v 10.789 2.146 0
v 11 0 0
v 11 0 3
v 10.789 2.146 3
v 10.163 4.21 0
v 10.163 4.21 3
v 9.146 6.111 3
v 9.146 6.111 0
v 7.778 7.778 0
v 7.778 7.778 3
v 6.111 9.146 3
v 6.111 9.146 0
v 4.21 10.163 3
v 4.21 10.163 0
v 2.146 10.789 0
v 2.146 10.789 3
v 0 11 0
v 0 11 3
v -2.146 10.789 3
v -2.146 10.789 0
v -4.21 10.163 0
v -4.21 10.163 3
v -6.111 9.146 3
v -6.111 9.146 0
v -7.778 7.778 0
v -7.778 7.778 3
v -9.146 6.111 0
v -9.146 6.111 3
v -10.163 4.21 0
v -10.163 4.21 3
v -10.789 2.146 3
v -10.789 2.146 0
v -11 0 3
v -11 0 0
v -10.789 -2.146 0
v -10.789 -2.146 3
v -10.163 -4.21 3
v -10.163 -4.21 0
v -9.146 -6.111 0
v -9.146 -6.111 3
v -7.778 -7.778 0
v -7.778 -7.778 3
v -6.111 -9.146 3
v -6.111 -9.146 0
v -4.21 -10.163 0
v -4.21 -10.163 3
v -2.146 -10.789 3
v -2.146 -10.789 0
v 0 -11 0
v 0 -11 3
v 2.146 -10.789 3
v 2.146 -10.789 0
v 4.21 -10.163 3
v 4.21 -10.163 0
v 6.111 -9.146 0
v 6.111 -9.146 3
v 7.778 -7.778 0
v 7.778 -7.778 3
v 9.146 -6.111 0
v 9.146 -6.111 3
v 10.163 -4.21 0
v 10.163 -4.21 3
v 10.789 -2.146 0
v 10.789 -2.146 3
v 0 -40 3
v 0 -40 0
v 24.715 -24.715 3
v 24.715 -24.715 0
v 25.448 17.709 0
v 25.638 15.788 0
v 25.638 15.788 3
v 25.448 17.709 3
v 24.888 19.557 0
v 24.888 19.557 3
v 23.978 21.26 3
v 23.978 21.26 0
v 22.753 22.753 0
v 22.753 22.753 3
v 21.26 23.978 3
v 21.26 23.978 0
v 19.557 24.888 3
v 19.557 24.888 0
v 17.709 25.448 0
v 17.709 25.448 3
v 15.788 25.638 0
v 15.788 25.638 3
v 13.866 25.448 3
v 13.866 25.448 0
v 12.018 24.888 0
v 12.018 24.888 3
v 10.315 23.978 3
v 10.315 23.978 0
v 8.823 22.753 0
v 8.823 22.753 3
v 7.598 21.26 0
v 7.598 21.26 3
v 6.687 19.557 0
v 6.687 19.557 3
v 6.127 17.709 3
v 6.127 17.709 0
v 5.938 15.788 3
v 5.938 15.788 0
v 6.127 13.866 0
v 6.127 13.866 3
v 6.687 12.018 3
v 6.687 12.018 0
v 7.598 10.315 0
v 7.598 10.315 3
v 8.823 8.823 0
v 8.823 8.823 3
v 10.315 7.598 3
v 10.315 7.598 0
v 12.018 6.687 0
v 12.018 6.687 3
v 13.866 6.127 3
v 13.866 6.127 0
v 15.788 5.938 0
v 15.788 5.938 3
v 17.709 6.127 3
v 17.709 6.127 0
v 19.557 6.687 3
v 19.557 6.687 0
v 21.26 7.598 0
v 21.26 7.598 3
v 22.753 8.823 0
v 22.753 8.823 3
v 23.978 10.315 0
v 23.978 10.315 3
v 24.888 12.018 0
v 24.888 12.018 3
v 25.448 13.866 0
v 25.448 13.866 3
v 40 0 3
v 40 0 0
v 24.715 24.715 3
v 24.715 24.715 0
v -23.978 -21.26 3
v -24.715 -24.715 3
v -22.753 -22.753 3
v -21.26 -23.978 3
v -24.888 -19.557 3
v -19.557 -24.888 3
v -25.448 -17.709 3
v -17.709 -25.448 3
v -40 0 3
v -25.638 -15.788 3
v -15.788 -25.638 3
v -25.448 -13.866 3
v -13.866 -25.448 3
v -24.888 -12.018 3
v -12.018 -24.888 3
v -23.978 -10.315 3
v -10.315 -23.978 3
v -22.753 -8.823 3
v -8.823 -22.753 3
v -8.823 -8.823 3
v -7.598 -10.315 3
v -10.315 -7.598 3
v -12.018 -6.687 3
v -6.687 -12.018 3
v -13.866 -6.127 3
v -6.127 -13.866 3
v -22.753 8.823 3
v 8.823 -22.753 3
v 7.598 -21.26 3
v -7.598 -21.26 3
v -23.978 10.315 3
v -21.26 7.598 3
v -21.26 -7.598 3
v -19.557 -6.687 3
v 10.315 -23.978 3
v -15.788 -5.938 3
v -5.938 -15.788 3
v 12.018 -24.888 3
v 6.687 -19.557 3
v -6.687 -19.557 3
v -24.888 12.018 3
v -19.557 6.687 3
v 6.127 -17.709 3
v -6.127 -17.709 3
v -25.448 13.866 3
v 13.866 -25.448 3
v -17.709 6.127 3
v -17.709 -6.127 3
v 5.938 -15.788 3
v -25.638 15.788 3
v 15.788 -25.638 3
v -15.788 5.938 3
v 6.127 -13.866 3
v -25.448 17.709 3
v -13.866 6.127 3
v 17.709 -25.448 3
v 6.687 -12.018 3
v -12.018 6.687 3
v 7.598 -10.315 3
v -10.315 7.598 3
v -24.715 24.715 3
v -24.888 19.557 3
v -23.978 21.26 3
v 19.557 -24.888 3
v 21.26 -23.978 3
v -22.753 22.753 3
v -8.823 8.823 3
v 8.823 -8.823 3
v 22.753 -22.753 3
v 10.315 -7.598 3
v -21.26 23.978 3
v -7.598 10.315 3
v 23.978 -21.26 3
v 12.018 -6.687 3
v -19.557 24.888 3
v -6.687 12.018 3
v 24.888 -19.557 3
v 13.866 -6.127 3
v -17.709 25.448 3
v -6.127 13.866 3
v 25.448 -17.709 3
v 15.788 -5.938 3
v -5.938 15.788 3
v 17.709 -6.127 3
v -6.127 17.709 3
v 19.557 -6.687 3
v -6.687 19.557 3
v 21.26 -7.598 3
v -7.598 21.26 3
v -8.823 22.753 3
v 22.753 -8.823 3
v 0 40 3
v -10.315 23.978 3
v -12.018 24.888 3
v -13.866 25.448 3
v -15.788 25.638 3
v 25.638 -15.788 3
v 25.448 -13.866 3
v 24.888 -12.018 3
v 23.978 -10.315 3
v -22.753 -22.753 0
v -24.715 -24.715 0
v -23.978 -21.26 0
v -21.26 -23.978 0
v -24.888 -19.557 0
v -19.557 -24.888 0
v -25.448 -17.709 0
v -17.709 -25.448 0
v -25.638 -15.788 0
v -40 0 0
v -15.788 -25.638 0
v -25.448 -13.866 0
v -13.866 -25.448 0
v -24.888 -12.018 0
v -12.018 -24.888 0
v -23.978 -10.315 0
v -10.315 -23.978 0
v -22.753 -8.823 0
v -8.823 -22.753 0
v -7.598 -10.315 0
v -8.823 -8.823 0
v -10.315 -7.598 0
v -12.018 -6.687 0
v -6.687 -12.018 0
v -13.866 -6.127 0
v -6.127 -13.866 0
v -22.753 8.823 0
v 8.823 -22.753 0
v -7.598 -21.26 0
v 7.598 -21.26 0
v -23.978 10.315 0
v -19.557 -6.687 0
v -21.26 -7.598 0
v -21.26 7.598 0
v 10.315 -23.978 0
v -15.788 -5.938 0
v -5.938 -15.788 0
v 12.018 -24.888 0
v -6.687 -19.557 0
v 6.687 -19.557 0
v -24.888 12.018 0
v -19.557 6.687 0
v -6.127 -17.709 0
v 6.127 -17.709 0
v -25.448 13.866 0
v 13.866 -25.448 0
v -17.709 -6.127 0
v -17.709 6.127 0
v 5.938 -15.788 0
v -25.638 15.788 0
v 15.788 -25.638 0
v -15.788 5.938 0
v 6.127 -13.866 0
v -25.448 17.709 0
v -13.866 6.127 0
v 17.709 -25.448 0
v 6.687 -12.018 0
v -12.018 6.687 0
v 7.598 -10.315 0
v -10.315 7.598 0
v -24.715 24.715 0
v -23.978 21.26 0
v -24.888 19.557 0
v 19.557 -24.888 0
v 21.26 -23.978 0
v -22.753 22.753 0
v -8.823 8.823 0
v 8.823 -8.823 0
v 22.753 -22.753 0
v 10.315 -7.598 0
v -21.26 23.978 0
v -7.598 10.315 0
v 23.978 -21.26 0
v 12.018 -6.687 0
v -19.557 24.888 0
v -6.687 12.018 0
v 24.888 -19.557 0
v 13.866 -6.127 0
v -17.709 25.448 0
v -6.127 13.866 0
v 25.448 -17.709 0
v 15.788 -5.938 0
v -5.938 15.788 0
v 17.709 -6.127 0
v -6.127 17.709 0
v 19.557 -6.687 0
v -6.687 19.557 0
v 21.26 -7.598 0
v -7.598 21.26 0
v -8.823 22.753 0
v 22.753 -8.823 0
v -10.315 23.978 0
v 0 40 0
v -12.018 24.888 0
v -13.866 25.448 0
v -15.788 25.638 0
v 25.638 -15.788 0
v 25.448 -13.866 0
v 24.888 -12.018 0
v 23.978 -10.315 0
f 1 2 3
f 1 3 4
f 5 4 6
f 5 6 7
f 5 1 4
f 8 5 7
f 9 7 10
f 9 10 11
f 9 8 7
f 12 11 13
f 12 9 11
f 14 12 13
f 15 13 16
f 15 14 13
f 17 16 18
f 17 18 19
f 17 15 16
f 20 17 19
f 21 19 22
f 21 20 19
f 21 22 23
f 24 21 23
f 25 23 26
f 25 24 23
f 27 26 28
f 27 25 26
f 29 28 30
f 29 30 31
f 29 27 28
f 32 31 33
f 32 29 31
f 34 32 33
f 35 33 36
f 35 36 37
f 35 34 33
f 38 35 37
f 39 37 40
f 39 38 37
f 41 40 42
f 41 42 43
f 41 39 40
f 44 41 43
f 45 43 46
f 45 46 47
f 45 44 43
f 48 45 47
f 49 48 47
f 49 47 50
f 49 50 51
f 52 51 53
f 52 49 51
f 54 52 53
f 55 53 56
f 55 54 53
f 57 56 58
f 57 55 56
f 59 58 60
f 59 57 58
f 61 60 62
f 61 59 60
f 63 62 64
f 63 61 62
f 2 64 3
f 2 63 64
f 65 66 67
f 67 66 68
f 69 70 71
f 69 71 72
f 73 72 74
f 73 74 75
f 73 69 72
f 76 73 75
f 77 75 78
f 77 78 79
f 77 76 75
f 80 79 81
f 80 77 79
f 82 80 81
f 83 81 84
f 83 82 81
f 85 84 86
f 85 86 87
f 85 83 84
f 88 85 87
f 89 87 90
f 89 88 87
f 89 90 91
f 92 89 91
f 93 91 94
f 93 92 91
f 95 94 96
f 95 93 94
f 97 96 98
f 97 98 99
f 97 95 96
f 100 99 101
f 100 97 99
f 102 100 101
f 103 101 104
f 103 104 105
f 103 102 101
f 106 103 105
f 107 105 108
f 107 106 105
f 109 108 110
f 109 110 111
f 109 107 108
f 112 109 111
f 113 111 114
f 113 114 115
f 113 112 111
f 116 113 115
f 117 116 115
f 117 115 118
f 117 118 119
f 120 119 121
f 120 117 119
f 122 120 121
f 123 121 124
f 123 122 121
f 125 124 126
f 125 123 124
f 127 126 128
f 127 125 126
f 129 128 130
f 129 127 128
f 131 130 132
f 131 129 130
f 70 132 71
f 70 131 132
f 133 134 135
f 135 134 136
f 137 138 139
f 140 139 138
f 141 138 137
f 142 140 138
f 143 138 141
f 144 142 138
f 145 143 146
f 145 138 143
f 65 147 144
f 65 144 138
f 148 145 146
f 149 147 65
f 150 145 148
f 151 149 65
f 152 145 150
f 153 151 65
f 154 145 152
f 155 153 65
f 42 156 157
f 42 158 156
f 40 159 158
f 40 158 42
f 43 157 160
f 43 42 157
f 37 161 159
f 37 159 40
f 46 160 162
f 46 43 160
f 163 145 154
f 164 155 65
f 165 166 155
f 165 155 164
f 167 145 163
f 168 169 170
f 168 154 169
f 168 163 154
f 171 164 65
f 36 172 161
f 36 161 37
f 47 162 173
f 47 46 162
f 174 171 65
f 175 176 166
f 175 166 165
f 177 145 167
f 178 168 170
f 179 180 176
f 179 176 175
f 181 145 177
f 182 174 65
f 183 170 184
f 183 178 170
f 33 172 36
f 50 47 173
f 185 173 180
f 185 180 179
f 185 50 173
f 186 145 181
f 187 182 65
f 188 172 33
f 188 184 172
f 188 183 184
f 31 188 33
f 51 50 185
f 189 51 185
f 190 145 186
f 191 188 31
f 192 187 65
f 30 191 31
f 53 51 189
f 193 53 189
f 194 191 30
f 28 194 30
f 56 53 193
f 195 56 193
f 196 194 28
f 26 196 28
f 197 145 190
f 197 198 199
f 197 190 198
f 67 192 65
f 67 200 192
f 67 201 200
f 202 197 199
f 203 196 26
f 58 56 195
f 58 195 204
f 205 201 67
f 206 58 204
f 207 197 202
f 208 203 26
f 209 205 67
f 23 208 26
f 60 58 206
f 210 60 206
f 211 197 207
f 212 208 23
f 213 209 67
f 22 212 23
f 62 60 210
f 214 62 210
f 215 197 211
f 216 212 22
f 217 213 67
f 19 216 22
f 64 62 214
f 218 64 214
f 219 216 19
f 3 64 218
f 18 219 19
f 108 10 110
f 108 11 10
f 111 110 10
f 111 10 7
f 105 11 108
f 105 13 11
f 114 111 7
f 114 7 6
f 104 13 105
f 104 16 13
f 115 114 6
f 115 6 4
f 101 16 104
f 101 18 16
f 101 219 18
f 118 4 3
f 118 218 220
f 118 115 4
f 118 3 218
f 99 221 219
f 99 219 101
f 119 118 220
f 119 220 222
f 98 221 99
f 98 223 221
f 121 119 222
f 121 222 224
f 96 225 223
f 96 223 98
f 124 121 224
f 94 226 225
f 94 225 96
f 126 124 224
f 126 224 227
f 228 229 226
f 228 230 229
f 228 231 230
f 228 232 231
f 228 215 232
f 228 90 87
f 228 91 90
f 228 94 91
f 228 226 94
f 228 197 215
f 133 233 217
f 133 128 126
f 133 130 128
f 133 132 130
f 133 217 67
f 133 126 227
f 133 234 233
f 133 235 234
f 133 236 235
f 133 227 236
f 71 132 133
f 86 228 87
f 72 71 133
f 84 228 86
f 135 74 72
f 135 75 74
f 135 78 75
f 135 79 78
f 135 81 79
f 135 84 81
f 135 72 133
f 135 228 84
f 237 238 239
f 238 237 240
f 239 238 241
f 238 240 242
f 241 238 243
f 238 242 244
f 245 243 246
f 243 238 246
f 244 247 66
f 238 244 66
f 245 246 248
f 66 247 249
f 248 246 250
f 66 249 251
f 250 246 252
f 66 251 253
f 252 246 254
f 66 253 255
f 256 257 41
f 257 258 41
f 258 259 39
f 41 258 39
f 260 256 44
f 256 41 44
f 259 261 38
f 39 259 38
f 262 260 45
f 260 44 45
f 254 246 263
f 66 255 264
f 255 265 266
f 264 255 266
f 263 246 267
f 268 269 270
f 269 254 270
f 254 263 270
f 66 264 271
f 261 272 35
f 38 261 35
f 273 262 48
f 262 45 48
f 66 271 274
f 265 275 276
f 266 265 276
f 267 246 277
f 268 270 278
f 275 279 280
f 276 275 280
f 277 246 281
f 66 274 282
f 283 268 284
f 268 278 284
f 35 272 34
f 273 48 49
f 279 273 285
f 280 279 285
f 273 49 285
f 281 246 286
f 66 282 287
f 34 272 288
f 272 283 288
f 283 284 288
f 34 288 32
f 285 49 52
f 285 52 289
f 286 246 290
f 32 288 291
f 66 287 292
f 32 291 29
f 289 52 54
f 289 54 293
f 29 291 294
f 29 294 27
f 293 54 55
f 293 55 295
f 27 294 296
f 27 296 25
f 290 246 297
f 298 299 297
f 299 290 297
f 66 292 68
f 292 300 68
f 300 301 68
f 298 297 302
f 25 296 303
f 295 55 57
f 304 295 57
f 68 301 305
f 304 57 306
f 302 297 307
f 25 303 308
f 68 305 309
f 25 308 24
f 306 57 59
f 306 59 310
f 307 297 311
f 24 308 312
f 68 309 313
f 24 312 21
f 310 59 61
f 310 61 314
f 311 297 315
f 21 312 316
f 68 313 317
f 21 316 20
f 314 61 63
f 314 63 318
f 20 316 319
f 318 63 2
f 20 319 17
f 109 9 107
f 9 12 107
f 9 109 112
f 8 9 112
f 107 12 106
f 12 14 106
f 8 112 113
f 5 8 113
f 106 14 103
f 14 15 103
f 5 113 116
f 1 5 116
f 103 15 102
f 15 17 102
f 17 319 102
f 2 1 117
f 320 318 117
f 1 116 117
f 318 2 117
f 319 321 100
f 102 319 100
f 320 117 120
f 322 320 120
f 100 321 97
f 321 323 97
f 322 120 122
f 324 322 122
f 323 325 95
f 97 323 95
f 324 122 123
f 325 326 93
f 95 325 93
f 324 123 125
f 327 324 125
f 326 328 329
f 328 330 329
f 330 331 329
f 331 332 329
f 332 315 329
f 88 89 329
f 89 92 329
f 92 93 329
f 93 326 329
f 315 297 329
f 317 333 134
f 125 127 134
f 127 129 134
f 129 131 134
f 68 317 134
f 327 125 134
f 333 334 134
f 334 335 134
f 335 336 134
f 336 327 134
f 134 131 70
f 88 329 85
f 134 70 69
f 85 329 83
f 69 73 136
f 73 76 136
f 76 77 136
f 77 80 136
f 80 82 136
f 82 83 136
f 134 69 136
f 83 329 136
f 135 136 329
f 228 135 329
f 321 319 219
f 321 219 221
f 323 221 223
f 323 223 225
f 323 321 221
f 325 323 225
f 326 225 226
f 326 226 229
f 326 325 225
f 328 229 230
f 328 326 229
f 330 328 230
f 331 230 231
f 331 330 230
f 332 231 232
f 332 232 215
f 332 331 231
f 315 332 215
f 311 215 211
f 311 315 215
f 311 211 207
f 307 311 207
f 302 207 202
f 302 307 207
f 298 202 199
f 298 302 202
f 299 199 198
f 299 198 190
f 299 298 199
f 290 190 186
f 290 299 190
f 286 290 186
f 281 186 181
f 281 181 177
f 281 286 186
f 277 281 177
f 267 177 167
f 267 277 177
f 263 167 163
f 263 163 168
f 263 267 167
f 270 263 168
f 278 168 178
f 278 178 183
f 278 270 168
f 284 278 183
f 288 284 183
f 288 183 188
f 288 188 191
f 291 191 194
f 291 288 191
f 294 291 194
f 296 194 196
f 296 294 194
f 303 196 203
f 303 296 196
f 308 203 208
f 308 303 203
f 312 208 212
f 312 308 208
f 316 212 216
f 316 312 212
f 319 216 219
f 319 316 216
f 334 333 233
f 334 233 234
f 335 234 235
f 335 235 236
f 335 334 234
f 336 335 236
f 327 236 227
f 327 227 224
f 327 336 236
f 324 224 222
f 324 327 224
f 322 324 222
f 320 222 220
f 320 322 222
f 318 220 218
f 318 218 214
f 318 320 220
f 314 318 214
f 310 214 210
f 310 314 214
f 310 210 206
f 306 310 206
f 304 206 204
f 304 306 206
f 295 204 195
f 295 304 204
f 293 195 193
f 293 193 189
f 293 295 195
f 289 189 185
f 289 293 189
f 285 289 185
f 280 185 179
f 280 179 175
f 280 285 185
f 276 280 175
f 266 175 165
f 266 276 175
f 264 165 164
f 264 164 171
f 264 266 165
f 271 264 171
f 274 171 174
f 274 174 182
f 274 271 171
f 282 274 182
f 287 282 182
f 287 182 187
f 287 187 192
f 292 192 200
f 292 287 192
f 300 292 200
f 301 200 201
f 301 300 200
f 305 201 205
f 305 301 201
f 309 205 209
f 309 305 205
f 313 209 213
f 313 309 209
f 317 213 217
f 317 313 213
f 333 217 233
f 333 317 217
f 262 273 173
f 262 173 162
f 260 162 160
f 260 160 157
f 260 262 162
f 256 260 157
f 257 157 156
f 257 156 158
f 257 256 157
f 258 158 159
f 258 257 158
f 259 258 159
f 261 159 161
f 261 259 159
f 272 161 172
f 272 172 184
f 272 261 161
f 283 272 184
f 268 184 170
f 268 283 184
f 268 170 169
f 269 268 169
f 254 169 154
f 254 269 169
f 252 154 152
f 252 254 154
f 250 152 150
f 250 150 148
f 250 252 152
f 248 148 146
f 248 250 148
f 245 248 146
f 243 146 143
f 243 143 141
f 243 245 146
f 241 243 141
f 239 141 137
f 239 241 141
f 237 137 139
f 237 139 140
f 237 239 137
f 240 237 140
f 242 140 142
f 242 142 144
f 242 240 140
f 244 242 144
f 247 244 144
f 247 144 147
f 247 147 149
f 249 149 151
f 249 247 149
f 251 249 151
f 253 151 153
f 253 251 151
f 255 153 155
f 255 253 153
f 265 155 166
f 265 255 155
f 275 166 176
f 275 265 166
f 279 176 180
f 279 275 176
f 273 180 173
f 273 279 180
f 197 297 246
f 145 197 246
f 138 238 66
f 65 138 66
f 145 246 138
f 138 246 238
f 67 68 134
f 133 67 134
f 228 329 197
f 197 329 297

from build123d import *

# Parameters (mm, degrees)
F0_R     = 9.85
F0_R_2   = 11
F1_DEPTH = 3


with BuildPart() as f1:
    # F0 (on Top) → F1 (new body)
    with BuildSketch(Plane.XY):
        Polygon((24.715097, 24.715097), (0, 40), (-24.715097, 24.715097), (-40, 0), (-24.715097, -24.715097), (0, -40), (24.715097, -24.715097), (40, 0), align=None)
        with Locations((-15.78759, -15.78759)):
            Circle(F0_R, mode=Mode.SUBTRACT)
        with Locations((15.78759, -15.78759)):
            Circle(F0_R, mode=Mode.SUBTRACT)
        with Locations((-15.78759, 15.78759)):
            Circle(F0_R, mode=Mode.SUBTRACT)
        Circle(F0_R_2, mode=Mode.SUBTRACT)
        with Locations((15.78759, 15.78759)):
            Circle(F0_R, mode=Mode.SUBTRACT)
    extrude(amount=F1_DEPTH)


solid = f1.part
